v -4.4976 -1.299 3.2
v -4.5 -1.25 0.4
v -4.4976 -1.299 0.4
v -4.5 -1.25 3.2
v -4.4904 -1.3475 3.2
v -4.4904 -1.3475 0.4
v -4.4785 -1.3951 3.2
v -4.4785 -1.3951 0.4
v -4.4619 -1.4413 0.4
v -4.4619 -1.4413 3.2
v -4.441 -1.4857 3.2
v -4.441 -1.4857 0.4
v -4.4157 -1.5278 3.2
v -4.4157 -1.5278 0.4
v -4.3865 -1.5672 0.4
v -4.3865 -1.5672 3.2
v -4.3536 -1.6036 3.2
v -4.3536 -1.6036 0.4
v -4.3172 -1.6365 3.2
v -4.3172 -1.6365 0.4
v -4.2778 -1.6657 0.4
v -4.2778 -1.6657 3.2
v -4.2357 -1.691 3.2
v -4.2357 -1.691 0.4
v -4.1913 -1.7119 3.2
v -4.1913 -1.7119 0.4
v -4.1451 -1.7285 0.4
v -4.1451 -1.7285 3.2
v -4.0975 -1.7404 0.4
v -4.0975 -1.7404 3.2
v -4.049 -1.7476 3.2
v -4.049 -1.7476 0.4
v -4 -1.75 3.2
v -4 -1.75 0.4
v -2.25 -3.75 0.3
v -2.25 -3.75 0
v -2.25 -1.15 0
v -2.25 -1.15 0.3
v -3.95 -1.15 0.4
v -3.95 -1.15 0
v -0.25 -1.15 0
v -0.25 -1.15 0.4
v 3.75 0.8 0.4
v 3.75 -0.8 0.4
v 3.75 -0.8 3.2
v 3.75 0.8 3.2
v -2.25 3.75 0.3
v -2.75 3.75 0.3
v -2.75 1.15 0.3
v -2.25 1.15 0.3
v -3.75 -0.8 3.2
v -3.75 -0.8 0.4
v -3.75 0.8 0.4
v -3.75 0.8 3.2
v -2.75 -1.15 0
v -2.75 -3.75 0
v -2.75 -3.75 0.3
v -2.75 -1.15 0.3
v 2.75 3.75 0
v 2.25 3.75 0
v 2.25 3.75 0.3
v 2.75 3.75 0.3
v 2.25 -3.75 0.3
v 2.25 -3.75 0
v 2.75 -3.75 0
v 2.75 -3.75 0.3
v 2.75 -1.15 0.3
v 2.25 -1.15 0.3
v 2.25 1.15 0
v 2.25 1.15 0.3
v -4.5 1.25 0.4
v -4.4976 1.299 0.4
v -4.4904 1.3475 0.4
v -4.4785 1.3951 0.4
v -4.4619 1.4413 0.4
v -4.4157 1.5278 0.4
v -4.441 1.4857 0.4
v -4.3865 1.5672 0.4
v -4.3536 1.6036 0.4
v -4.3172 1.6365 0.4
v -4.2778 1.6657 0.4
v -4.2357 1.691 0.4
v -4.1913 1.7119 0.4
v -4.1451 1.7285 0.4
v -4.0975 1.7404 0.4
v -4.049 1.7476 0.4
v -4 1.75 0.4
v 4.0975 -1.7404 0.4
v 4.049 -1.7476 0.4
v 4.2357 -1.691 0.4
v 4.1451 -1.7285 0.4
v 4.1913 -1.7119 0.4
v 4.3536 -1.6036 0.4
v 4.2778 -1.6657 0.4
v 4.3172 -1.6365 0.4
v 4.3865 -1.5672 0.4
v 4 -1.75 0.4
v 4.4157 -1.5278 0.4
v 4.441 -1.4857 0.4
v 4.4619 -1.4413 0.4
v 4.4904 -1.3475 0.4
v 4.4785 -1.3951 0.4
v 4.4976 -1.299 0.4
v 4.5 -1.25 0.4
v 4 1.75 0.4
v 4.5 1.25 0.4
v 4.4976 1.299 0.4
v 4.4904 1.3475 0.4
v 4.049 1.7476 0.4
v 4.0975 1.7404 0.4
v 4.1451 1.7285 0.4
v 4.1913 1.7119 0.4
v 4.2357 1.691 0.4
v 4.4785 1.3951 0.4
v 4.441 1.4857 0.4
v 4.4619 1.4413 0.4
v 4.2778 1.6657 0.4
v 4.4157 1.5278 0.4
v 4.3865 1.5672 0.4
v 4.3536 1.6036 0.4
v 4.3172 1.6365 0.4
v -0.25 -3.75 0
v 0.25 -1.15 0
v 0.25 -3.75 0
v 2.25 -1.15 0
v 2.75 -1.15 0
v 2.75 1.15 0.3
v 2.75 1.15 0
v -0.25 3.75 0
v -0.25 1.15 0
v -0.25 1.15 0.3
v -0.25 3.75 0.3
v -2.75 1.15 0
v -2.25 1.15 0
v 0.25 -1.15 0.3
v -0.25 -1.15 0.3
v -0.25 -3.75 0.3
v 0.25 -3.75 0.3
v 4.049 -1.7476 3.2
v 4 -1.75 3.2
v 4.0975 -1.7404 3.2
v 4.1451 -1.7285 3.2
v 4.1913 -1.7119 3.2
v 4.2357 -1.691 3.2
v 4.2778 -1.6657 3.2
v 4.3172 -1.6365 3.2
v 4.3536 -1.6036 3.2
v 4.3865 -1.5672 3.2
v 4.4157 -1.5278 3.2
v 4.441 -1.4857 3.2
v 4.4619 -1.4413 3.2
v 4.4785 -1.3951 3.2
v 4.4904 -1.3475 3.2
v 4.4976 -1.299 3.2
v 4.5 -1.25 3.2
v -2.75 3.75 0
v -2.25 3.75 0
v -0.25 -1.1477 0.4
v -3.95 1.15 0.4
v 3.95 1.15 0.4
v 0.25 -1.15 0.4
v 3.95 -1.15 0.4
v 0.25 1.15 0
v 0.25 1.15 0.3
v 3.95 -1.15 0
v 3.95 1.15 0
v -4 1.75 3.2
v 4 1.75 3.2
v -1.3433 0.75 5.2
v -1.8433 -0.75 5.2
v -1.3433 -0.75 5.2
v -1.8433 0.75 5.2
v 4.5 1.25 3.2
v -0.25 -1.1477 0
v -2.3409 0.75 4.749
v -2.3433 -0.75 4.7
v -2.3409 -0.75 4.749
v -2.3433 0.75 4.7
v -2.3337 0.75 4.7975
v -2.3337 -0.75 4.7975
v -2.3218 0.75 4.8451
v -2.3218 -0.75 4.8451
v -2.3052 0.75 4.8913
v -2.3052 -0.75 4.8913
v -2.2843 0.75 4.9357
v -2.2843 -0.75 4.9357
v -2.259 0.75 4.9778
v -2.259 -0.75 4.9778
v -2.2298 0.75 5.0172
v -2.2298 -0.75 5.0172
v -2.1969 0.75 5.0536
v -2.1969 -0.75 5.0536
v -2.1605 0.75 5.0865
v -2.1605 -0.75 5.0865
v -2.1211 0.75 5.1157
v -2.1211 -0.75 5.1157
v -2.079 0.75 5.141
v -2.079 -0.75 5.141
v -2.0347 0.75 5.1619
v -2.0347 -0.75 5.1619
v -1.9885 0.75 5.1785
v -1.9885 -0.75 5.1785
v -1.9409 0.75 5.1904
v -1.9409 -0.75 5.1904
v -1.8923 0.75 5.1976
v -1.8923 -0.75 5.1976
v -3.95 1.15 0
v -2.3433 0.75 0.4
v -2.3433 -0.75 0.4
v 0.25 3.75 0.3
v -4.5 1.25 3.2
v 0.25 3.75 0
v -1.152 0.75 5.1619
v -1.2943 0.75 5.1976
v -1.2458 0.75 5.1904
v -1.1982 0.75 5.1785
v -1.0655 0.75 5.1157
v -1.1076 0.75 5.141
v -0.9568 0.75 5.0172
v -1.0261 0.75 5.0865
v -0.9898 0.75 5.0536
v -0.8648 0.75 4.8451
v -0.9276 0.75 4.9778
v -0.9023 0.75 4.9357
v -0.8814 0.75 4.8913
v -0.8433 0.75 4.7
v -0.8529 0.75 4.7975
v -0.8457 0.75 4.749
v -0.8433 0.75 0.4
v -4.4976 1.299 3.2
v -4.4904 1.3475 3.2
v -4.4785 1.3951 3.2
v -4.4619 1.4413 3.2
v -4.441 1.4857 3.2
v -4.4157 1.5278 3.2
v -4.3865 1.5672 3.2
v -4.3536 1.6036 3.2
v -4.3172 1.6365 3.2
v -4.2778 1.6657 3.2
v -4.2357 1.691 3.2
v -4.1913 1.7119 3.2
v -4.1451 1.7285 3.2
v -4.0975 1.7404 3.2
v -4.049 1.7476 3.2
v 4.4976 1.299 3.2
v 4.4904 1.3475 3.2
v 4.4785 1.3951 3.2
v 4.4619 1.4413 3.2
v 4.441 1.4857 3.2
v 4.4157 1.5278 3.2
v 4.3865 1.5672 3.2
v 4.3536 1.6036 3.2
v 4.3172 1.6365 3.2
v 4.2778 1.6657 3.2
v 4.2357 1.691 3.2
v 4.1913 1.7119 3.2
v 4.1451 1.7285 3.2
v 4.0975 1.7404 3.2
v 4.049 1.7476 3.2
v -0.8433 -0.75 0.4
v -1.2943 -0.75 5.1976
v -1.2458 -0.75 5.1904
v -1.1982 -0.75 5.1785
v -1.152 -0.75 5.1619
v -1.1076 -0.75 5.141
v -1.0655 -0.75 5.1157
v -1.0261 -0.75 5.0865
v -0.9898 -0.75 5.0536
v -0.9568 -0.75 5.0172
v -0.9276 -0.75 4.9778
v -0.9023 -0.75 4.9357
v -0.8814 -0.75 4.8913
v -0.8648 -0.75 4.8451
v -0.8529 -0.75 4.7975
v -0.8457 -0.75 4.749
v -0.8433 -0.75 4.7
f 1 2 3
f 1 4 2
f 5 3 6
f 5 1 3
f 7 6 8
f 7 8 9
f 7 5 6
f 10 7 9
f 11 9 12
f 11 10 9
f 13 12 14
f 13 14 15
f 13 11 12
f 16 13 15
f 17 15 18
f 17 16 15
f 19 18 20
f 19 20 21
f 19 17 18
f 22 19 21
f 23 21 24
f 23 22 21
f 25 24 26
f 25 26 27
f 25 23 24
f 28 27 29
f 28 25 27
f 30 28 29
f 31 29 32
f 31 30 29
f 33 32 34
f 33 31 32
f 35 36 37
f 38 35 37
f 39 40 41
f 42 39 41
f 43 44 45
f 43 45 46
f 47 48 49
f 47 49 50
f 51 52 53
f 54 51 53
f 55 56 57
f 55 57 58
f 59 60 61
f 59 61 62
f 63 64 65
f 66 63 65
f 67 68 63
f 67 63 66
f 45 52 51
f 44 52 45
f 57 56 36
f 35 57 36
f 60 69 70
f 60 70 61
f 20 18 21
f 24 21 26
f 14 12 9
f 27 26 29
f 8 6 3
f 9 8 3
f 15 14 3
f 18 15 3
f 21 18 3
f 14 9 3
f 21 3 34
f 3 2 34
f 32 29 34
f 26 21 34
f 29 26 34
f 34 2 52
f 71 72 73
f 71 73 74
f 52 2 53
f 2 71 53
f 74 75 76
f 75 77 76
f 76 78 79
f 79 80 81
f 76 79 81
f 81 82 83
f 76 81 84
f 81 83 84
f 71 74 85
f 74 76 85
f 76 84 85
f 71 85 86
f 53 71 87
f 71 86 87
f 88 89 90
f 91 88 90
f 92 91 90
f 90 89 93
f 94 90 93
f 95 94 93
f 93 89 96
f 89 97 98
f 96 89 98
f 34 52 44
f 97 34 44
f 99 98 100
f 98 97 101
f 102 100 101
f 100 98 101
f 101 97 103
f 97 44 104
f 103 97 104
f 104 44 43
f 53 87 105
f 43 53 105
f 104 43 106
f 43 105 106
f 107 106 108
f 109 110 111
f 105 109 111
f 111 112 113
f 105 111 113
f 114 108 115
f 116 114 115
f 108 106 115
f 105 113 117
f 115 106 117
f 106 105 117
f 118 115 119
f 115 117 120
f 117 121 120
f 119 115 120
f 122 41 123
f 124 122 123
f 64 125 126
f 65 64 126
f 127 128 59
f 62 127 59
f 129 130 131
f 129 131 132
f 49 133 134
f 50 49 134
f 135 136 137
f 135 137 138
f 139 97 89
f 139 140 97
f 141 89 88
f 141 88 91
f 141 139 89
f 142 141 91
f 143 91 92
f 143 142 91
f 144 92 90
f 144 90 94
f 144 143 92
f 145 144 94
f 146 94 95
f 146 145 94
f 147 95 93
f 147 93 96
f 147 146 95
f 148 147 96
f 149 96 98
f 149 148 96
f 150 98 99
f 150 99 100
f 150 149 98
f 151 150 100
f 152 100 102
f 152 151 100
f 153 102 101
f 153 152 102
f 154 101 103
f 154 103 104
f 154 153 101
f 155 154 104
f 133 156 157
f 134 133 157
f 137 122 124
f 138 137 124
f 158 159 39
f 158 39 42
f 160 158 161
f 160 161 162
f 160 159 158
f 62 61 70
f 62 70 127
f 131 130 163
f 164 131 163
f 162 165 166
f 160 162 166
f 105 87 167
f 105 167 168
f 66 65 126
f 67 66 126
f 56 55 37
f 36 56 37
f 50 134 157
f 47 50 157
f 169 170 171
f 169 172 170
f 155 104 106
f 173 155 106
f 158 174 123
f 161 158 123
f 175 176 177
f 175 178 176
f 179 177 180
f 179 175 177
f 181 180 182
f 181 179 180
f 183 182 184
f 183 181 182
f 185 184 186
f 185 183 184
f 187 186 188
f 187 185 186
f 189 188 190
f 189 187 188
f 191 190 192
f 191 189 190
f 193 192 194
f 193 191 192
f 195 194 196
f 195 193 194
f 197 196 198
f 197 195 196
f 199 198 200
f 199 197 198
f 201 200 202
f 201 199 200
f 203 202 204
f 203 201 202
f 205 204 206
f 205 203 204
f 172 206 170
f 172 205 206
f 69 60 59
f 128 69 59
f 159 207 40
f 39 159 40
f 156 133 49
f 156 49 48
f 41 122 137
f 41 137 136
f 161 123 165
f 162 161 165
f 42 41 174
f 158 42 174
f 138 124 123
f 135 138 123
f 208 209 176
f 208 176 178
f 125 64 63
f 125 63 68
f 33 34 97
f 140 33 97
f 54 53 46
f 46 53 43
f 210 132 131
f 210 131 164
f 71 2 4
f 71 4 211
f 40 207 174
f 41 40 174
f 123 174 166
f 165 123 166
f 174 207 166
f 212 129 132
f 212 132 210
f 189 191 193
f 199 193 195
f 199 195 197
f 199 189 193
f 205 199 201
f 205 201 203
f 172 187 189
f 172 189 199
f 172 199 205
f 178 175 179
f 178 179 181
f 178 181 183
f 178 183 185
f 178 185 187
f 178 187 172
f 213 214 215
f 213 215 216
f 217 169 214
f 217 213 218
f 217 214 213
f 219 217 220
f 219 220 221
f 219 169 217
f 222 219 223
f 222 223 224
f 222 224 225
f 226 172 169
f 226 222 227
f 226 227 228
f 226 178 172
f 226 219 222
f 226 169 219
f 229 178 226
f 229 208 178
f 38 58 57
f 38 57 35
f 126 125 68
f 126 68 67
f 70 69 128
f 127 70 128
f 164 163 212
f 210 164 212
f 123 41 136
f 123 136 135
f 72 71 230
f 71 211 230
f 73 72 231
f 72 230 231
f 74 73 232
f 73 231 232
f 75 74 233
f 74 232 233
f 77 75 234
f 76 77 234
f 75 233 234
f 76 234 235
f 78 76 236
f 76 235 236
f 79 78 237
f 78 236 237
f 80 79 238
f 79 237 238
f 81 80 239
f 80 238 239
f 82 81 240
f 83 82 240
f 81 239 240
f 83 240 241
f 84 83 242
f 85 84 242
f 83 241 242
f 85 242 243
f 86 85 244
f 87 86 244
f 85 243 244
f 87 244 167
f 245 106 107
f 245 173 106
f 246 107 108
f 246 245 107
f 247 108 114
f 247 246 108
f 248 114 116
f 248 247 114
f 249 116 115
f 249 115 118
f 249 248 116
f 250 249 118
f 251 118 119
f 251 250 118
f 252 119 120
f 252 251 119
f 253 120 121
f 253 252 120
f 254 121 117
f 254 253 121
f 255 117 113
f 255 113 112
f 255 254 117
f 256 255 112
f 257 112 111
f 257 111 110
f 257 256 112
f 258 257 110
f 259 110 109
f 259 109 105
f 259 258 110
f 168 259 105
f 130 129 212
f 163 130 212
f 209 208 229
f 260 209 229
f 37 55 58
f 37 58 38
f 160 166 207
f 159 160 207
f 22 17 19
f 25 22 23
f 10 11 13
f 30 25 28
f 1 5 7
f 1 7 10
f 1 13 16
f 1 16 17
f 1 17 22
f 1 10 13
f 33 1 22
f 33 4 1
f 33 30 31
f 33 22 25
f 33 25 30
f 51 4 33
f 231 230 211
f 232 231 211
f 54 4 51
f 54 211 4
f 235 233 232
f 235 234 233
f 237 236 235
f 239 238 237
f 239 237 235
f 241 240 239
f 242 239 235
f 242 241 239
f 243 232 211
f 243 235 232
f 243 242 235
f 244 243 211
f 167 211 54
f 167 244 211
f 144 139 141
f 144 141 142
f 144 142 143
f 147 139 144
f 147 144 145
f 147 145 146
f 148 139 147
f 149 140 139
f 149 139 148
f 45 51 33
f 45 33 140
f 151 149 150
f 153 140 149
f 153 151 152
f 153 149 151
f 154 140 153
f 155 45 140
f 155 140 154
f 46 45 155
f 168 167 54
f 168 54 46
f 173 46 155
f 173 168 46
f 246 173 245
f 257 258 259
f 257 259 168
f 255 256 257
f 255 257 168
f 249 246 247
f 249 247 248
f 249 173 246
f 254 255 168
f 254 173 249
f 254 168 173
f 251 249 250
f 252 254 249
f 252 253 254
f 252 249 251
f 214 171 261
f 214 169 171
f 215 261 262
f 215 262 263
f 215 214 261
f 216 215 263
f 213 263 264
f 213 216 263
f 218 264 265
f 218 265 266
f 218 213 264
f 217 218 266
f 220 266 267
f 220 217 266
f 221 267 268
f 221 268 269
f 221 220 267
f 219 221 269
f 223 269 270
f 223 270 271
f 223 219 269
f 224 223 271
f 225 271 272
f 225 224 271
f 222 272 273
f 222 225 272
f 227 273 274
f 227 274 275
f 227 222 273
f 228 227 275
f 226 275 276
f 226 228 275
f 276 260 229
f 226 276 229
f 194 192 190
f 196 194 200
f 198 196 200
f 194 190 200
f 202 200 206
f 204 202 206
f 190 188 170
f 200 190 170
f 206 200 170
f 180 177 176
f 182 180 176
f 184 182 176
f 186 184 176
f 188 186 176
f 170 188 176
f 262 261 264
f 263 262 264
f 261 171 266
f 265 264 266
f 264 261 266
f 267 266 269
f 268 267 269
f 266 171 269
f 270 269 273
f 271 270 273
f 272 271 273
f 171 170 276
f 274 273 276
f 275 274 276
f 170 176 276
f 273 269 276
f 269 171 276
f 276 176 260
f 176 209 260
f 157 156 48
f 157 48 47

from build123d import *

# Parameters (mm, degrees)
F2_W     = 9
F2_H     = 3.5
F2_W_2   = 7.5
F2_H_2   = 1.6
F3_DEPTH = 2.8
F4_DEPTH = 0.4
F2_W_3   = 1.5
F2_H_3   = 1.5
F5_DEPTH = 4.8
F0_W     = 0.5
F0_H     = 2.6
F6_DEPTH = 0.3
F7_R     = 0.5
F8_R     = 0.5
F9_R     = 0.5
F10_R    = 0.5
F11_R    = 0.5
F12_R    = 0.5


with BuildPart() as f3:
    # F2 (on offset) → F3 (new body)
    with BuildSketch(Plane.XY.offset(0.4)):
        Rectangle(F2_W, F2_H)
        Rectangle(F2_W_2, F2_H_2, mode=Mode.SUBTRACT)
    extrude(amount=F3_DEPTH)

    # F9
    f9_edges = [f3.edges().sort_by_distance(p)[0] for p in [
        (-4.5, -1.75, 1.8),
    ]]
    fillet(f9_edges, radius=F9_R)

    # F10
    f10_edges = [f3.edges().sort_by_distance(p)[0] for p in [
        (-4.5, 1.75, 1.8),
    ]]
    fillet(f10_edges, radius=F10_R)

    # F11
    f11_edges = [f3.edges().sort_by_distance(p)[0] for p in [
        (4.5, -1.75, 1.8),
    ]]
    fillet(f11_edges, radius=F11_R)

    # F12
    f12_edges = [f3.edges().sort_by_distance(p)[0] for p in [
        (4.5, 1.75, 1.8),
    ]]
    fillet(f12_edges, radius=F12_R)


with BuildPart() as f4:
    # F0 (on Top) → F4 (new body)
    with BuildSketch(Plane.XY):
        Polygon((3.95, -1.15), (3.95, 1.15), (2.75, 1.15), (2.25, 1.15), (0.25, 1.15), (-0.25, 1.15), (-2.25, 1.15), (-2.75, 1.15), (-3.95, 1.15), (-3.95, -1.15), (-2.75, -1.15), (-2.25, -1.15), (-0.25, -1.15), (-0.25, -1.147655), (0.25, -1.15), (2.25, -1.15), (2.75, -1.15), align=None)
    extrude(amount=F4_DEPTH)


with BuildPart() as f5:
    # F2 (on offset) → F5 (new body)
    with BuildSketch(Plane.XY.offset(0.4)):
        with Locations((-1.593309, 0)):
            Rectangle(F2_W_3, F2_H_3)
    extrude(amount=F5_DEPTH)

    # F7
    f7_edges = [f5.edges().sort_by_distance(p)[0] for p in [
        (-2.343309, 0, 5.2),
    ]]
    fillet(f7_edges, radius=F7_R)

    # F8
    f8_edges = [f5.edges().sort_by_distance(p)[0] for p in [
        (-0.843309, 0, 5.2),
    ]]
    fillet(f8_edges, radius=F8_R)


with BuildPart() as f6:
    # F0 (on Top) → F6 (new body)
    with BuildSketch(Plane.XY):
        with Locations((-2.5, 2.45)):
            Rectangle(F0_W, F0_H)
        with Locations((0, 2.45)):
            Rectangle(F0_W, F0_H)
        with Locations((2.5, 2.45)):
            Rectangle(F0_W, F0_H)
        with Locations((2.5, -2.45)):
            Rectangle(F0_W, F0_H)
        with Locations((0, -2.45)):
            Rectangle(F0_W, F0_H)
        with Locations((-2.5, -2.45)):
            Rectangle(F0_W, F0_H)
    extrude(amount=F6_DEPTH)


solid = Compound([f3.part, f4.part, f5.part, f6.part])
